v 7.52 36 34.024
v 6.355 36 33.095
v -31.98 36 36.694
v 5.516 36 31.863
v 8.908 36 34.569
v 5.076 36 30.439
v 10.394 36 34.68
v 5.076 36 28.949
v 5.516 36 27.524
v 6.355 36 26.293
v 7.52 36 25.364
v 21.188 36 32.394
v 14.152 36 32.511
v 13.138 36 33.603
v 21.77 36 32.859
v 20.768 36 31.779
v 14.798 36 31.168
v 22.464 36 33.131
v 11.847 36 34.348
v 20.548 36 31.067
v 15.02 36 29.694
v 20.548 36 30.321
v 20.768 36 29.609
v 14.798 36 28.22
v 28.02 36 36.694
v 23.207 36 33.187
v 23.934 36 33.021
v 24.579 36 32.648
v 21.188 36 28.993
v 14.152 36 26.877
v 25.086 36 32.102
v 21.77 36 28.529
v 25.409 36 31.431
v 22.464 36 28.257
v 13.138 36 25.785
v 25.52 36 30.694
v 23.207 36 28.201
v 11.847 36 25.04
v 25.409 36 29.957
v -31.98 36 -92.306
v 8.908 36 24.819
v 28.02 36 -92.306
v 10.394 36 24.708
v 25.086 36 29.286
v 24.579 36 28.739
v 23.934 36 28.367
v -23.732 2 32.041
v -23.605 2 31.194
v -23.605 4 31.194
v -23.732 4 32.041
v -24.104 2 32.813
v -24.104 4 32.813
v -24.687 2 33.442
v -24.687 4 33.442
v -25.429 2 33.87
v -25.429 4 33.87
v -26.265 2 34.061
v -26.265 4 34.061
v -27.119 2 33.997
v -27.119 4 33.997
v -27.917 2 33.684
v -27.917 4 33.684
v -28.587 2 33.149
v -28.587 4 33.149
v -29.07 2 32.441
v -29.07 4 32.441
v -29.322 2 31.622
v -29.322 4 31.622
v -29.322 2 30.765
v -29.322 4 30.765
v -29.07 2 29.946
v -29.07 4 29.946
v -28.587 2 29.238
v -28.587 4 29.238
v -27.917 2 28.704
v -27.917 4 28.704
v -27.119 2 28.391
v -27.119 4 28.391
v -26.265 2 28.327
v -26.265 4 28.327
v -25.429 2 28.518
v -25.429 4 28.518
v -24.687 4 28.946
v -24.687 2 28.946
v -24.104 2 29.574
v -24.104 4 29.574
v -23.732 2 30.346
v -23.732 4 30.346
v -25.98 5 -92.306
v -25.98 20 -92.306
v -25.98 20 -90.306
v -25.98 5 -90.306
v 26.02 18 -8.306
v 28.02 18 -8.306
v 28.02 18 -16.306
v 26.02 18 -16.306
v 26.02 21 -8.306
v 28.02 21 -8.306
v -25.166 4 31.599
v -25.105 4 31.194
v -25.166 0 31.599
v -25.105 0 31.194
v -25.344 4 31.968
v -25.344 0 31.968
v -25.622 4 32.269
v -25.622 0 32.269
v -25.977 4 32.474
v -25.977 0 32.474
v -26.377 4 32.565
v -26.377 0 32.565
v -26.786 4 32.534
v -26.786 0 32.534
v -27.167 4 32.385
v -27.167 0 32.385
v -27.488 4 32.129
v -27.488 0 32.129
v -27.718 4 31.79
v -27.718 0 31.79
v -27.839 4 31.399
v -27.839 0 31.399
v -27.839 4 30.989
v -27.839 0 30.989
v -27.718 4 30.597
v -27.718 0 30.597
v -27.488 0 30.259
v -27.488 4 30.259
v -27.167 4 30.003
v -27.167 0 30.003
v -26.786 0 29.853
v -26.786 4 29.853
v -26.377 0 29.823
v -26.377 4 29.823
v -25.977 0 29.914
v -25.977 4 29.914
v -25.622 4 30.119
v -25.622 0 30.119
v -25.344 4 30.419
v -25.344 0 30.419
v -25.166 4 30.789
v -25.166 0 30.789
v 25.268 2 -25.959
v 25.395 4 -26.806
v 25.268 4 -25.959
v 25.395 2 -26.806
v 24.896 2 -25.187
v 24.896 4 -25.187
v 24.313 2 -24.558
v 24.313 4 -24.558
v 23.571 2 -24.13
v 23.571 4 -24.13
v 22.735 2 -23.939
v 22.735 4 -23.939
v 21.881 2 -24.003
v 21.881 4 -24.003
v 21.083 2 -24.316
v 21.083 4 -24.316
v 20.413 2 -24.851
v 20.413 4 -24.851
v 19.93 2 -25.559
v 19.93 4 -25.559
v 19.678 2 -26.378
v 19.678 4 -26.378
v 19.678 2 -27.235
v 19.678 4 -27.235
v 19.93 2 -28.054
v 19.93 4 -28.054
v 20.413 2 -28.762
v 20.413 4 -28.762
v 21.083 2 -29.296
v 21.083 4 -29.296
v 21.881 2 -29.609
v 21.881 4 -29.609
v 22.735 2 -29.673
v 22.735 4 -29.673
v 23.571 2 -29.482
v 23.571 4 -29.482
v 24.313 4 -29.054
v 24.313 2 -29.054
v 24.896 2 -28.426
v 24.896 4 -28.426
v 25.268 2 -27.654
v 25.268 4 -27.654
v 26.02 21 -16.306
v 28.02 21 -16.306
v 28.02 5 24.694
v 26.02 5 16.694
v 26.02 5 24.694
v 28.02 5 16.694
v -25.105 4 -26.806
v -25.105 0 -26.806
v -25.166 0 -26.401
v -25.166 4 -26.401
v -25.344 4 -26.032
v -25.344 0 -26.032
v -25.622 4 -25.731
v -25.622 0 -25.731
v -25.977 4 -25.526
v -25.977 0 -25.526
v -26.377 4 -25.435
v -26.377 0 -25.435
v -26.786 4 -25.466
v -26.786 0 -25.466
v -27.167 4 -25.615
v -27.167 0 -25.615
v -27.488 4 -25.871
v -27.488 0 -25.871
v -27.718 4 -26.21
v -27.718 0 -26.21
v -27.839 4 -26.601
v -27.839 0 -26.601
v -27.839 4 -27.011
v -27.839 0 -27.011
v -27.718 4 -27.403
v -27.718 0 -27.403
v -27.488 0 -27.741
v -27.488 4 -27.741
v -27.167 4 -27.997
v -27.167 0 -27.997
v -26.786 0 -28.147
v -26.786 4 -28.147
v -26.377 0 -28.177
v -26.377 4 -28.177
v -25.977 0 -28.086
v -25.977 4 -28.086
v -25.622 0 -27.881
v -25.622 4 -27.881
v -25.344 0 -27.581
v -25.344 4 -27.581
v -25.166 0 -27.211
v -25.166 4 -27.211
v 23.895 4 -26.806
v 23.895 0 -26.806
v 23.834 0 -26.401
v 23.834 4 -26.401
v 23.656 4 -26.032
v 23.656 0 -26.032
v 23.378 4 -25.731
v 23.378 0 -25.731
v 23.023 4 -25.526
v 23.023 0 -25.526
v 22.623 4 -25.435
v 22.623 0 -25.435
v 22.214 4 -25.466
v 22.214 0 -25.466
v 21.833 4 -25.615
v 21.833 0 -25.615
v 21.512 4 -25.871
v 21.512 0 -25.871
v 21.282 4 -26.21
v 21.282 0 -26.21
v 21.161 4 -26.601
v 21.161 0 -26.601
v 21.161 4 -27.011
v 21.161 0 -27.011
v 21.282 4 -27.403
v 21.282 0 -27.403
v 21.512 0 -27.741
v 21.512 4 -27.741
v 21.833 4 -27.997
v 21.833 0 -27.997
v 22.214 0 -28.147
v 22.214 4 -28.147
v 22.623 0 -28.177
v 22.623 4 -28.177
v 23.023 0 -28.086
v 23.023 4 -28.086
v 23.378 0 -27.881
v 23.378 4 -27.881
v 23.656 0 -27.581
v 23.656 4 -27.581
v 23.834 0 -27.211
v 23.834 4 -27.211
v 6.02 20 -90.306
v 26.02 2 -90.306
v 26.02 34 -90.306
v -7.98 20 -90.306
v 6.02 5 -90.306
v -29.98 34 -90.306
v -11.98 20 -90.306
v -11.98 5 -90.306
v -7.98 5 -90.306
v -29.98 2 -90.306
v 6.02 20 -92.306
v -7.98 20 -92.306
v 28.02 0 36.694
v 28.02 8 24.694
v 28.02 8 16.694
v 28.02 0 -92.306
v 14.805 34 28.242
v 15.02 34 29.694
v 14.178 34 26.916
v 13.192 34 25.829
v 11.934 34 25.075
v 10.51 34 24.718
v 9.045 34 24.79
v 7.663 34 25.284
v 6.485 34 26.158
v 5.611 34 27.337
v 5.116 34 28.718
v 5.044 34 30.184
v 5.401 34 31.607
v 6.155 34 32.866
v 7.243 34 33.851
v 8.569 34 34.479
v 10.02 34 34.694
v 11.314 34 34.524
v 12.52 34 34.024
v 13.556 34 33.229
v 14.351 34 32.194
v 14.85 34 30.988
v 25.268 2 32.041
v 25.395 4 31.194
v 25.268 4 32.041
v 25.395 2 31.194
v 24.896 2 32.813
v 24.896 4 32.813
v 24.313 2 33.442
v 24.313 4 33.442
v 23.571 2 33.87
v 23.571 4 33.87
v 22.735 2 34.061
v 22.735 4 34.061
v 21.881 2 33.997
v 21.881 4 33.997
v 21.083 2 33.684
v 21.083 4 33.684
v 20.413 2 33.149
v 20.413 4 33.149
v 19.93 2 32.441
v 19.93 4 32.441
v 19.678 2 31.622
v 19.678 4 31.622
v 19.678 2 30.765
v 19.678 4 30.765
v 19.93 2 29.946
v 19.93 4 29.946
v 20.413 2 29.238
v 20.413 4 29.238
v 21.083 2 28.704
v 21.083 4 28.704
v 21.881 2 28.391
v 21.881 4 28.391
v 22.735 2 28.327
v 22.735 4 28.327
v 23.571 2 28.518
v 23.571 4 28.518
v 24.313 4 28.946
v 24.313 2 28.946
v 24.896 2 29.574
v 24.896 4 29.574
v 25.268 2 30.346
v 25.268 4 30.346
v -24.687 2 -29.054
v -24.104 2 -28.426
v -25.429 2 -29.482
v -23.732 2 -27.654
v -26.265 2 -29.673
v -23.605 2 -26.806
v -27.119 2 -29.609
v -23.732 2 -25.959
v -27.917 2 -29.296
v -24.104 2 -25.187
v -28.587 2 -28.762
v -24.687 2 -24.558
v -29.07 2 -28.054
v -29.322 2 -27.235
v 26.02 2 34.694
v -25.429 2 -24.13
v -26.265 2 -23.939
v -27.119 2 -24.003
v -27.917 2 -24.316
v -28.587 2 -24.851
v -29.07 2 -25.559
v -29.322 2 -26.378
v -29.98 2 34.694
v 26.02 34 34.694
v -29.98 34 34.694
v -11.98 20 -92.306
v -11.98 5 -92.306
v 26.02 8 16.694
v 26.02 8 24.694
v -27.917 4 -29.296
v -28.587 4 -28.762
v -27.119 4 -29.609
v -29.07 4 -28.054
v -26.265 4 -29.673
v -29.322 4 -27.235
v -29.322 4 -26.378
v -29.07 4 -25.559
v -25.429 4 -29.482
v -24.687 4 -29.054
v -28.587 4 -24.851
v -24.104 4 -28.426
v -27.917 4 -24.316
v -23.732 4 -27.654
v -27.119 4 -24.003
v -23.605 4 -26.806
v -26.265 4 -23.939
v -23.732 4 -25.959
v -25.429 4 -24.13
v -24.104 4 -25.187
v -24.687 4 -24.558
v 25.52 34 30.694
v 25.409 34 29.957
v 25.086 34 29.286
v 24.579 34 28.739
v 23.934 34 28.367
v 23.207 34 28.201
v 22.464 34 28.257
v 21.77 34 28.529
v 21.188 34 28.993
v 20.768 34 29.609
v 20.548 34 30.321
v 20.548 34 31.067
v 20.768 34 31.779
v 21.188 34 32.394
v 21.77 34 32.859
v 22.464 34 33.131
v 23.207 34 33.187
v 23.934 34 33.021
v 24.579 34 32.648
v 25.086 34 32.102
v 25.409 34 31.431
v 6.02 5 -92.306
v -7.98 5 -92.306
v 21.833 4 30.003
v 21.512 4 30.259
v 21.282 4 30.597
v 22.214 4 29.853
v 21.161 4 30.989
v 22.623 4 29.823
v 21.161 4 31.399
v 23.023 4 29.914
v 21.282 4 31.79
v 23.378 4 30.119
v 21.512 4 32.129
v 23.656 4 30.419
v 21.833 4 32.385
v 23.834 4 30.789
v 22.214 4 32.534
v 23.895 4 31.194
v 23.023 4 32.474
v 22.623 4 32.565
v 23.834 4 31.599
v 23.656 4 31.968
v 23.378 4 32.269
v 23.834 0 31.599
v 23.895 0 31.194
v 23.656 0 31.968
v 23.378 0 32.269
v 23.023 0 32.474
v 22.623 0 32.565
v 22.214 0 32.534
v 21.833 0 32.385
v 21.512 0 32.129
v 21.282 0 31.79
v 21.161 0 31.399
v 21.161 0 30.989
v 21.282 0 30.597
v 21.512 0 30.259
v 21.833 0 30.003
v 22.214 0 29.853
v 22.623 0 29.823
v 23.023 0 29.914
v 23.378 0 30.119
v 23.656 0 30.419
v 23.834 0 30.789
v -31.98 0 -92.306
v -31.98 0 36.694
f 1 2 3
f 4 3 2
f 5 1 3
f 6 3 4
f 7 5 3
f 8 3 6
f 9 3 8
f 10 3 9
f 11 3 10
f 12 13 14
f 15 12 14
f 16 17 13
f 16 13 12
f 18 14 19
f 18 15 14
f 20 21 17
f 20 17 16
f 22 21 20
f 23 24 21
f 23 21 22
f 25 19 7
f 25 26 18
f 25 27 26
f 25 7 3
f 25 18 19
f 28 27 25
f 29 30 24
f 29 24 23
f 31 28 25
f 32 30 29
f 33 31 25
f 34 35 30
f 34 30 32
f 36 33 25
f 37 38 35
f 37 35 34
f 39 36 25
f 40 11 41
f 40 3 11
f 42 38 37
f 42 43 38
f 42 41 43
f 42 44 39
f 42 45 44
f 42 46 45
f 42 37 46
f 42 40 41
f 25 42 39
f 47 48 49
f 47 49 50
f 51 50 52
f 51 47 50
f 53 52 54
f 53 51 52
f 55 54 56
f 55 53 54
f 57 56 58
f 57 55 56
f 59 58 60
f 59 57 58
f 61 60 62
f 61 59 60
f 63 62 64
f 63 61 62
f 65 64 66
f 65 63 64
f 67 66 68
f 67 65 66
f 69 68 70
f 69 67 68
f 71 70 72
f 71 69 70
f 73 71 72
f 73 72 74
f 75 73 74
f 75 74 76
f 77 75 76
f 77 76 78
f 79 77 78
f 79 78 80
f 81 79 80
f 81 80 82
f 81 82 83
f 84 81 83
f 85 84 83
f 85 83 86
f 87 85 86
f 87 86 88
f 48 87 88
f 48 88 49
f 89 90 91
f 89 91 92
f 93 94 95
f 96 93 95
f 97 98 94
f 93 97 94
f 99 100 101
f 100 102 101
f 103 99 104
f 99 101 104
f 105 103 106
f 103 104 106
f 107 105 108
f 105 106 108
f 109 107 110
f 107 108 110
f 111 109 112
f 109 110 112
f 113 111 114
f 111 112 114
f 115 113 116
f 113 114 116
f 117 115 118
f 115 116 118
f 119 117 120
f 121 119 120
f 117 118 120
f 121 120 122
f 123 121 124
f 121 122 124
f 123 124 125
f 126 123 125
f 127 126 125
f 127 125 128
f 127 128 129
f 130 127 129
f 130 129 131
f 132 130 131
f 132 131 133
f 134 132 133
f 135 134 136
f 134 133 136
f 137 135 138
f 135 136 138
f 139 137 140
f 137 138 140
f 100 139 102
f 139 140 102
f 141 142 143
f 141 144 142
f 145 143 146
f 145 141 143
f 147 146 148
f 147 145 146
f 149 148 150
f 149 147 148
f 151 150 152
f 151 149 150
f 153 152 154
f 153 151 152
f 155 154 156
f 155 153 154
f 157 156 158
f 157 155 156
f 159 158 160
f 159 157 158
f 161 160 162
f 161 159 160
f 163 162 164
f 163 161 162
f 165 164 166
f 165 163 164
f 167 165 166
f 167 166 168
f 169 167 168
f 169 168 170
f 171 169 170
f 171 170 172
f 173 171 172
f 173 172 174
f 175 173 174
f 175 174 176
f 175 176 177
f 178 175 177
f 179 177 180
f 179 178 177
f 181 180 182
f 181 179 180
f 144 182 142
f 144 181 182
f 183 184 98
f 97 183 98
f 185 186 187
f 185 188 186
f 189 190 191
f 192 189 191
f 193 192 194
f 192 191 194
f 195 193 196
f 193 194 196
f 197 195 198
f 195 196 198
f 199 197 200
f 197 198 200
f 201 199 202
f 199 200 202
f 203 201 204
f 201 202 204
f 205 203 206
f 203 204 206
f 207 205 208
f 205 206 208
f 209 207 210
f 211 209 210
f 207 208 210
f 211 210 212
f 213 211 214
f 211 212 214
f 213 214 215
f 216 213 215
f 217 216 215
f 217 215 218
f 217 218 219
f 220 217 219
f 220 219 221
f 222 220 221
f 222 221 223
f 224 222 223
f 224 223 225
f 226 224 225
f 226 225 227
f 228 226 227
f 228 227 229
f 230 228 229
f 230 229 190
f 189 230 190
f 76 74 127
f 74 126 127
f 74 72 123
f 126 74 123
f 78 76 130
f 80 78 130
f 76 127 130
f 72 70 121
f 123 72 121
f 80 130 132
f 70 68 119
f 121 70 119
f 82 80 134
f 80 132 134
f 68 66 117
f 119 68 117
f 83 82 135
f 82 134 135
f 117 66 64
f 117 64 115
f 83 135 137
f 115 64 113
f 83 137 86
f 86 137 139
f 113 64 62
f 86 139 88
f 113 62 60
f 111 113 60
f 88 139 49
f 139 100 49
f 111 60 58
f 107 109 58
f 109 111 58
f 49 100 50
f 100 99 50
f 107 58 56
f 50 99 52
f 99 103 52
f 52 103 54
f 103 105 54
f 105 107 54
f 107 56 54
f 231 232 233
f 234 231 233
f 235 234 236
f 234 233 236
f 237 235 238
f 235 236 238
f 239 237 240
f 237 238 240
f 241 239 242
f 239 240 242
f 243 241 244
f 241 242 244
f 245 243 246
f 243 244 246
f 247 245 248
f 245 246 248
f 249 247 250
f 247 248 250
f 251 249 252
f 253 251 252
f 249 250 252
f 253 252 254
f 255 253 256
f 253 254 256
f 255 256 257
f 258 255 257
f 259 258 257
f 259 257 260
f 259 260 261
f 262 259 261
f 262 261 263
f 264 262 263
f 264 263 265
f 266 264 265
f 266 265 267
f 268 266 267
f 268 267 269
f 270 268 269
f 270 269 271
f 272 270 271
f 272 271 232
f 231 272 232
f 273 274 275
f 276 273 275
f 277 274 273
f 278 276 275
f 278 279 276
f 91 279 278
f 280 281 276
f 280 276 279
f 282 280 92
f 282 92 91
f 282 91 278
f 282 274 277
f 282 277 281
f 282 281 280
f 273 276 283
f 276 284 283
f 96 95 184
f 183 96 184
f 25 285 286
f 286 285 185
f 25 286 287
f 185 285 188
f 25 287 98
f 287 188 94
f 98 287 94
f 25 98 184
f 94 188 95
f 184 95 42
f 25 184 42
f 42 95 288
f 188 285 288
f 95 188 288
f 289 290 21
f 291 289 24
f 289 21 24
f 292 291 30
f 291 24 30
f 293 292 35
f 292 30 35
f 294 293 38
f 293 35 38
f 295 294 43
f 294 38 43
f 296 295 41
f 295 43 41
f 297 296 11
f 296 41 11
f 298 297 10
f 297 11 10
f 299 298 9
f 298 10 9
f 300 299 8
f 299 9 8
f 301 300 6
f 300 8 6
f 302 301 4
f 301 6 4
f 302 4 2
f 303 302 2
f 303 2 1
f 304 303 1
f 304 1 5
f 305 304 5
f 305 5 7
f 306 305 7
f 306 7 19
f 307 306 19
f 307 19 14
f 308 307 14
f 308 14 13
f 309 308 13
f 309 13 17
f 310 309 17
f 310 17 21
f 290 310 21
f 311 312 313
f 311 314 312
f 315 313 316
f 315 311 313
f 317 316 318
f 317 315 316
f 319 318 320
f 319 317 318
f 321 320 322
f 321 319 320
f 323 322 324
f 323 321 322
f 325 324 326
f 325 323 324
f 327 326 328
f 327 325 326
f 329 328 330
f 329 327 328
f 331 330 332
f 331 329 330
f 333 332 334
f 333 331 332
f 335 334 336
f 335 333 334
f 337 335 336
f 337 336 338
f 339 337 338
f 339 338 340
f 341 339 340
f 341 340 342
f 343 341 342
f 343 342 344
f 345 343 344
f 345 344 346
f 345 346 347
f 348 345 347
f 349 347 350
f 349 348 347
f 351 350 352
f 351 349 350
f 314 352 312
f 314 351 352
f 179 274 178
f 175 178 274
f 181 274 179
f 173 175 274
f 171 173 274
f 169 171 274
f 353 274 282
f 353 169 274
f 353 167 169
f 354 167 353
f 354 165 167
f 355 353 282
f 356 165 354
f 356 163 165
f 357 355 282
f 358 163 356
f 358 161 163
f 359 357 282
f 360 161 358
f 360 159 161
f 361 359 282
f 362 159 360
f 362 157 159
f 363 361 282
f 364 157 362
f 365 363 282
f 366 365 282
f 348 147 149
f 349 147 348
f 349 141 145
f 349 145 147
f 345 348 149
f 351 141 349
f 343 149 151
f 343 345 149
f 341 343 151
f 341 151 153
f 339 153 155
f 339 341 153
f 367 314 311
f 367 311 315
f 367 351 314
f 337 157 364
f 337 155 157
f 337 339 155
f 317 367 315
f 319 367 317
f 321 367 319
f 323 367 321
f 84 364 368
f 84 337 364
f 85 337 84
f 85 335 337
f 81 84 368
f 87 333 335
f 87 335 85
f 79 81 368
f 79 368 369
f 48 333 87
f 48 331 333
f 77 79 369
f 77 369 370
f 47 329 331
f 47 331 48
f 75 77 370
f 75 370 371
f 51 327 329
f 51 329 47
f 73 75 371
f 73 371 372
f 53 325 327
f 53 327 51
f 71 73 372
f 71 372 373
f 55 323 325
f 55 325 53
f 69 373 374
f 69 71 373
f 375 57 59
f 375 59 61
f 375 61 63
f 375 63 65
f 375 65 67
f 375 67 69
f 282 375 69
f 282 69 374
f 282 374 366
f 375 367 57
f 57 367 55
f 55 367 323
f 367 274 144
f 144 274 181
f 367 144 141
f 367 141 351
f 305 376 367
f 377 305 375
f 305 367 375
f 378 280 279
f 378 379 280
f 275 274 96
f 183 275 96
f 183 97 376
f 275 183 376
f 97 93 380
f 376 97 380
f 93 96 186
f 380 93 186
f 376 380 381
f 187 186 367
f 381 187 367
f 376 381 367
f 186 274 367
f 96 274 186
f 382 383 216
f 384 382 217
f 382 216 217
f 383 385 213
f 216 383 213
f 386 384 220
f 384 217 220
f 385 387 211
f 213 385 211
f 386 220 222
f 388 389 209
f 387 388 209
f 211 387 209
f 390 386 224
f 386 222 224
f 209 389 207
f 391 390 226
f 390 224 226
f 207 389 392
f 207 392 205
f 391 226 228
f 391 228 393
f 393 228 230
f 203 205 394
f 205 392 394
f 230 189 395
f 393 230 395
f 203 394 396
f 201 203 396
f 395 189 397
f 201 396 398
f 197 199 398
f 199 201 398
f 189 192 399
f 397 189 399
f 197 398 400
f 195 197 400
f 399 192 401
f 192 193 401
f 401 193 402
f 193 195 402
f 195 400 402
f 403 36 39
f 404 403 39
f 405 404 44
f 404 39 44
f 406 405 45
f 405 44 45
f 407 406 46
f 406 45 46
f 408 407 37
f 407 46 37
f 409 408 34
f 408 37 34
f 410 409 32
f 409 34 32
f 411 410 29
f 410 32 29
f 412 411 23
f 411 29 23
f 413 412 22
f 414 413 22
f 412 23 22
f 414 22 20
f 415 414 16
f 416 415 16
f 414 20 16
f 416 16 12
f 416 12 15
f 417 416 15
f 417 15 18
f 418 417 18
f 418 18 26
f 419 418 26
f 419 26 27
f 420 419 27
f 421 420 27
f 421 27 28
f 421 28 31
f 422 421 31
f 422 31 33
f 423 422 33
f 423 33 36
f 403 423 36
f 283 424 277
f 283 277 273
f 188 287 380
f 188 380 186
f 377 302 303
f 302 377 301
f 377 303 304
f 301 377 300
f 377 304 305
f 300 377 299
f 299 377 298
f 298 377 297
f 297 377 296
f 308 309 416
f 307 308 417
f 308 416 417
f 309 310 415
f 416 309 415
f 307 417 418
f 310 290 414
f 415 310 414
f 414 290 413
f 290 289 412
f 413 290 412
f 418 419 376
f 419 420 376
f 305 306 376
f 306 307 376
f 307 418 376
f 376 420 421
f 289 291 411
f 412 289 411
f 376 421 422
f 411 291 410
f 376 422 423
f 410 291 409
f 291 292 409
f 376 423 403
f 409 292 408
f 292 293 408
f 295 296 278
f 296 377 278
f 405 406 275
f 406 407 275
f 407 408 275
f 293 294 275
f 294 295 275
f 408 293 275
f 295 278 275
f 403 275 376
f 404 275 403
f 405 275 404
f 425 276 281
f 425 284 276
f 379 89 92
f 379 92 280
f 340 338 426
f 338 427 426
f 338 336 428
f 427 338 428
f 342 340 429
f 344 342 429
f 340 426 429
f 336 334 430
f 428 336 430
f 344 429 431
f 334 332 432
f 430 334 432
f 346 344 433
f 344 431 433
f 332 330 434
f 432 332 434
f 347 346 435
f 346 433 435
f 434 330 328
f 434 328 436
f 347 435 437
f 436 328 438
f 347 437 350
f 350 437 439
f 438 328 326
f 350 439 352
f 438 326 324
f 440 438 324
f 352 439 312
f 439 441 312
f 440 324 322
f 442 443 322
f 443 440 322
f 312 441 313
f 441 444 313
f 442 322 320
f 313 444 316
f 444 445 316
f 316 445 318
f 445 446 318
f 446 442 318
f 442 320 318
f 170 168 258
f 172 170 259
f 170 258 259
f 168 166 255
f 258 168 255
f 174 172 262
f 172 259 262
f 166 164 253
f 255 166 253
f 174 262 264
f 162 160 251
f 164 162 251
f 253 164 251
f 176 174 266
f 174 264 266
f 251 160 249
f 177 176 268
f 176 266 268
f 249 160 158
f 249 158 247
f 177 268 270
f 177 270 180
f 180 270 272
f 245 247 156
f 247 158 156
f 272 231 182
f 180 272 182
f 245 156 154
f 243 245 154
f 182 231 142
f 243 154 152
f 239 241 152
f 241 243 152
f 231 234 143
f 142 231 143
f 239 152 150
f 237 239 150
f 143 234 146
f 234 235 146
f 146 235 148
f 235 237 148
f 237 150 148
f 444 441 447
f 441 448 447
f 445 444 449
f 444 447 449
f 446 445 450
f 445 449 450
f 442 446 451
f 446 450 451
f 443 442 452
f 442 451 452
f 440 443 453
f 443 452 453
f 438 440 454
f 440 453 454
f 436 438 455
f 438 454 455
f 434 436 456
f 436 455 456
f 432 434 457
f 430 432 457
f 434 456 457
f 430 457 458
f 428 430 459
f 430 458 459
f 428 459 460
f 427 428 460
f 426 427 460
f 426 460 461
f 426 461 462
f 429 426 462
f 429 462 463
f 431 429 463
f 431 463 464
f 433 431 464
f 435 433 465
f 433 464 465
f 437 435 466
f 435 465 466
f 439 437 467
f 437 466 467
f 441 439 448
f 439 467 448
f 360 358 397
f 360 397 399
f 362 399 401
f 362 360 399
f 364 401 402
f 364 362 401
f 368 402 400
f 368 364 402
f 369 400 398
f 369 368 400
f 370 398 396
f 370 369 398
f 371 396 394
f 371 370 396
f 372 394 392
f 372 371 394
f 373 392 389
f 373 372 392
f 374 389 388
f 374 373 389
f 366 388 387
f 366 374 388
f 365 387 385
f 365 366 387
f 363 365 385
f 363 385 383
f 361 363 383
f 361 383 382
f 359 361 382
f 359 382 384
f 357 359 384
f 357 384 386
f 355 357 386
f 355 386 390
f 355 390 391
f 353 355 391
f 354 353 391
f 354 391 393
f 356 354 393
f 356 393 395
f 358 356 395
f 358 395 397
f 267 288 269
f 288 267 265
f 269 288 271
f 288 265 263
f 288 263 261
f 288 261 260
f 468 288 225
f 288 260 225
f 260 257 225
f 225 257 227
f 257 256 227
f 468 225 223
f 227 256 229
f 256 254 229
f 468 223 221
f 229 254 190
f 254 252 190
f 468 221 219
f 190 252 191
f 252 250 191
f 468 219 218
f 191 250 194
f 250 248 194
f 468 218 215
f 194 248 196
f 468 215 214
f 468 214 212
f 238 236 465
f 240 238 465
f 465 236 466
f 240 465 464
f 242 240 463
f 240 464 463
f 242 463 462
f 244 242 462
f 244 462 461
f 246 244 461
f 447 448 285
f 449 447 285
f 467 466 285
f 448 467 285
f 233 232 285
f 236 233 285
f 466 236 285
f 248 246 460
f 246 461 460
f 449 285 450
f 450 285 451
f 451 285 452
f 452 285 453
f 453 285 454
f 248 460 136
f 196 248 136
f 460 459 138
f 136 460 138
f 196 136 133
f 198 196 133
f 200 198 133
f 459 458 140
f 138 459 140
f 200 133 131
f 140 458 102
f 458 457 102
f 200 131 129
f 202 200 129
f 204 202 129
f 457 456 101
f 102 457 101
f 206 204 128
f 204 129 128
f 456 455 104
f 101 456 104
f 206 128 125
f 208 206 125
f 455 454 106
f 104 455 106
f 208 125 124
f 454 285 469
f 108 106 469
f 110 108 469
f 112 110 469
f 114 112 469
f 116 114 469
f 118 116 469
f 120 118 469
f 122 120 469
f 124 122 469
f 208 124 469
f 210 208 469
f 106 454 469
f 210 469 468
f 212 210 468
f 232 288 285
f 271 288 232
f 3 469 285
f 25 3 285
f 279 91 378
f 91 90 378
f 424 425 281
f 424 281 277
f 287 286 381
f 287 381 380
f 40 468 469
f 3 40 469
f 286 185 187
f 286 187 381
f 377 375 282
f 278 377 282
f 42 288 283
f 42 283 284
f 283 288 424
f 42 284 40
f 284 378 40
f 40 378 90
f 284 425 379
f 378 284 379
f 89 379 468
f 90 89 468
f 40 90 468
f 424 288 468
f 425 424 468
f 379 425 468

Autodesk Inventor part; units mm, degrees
ref_plane "YZ Plane" through (0, 0, 0) normal (1, 0, 0) x (0, 1, 0)
ref_plane "XZ Plane" through (0, 0, 0) normal (0, 1, 0) x (-1, 0, 0)
ref_plane "XY Plane" through (0, 0, 0) normal (0, 0, 1) x (1, 0, 0)
sketch "Esquisse1" plane through (0, 0, 0) normal (0, 1, 0) x (-1, 0, 0)
  line L0 (29.9796, 34.6939) -> (-26.0204, 34.6939)
  line L1 (-26.0204, 34.6939) -> (-26.0204, -50.3061)
  line L2 (29.9796, -50.3061) -> (29.9796, 34.6939)
  circle A0 centre (26.4796, 31.1939) radius 1.375
  circle A1 centre (-22.5204, 31.1939) radius 1.375
  circle A2 centre (26.4796, -26.8061) radius 1.375
  circle A3 centre (-22.5204, -26.8061) radius 1.375
  circle A4 centre (26.4796, 31.1939) radius 2.875
  circle A5 centre (-22.5204, 31.1939) radius 2.875
  circle A6 centre (-22.5204, -26.8061) radius 2.875
  circle A7 centre (26.4796, -26.8061) radius 2.875
  line L3 (-26.0204, -50.3061) -> (-26.0204, -90.3061)
  line L4 (-26.0204, -90.3061) -> (29.9796, -90.3061)
  line L5 (29.9796, -90.3061) -> (29.9796, -50.3061)
  line L6 (31.9796, 36.6939) -> (-28.0204, 36.6939)
  line L7 (-28.0204, 36.6939) -> (-28.0204, -92.3061)
  line L8 (-28.0204, -92.3061) -> (31.9796, -92.3061)
  line L9 (31.9796, -92.3061) -> (31.9796, 36.6939)
  point P0 (0, 0)
  dimension "d3" = 2.75
  dimension "d4" = 3.5
  dimension "d5" = 2.75
  dimension "d6" = 3.5
  dimension "d7" = 3.5
  dimension "d8" = 49
  dimension "d9" = 2.75
  dimension "d10" = 58
  dimension "d11" = 3.5
  dimension "d12" = 2.75
  dimension "d13" = 3.5
  dimension "d14" = 58
  dimension "d15" = 5.75
  dimension "d16" = 5.75
  dimension "d17" = 5.75
  dimension "d18" = 5.75
  dimension "d21" = 2
  dimension "d22" = 2
  dimension "d23" = 2
  dimension "d24" = 2
  dimension "d25" = 125
extrude "Extrusion1" add sketch "Esquisse1" along normal blind 2 contours L2 L5 L4 L3 L1 L0 | L9 L8 L7 L6
sketch "Esquisse2" plane through (0, 0, 0) normal (0, -1, 0) x (1, 0, 0)
  circle A0 centre (22.5204, 31.1939) radius 2.875 projected
  circle A1 centre (22.5204, 31.1939) radius 1.375
  circle A2 centre (-26.4796, 31.1939) radius 1.375
  circle A3 centre (22.5204, -26.8061) radius 1.375
  circle A4 centre (-26.4796, -26.8061) radius 1.375
  circle A5 centre (22.5204, -26.8061) radius 2.875 projected
  circle A6 centre (-26.4796, -26.8061) radius 2.875 projected
  circle A7 centre (-26.4796, 31.1939) radius 2.875 projected
  point P0 (0, 0)
  dimension "d28" = 2.75
  dimension "d29" = 2.75
  dimension "d30" = 2.75
  dimension "d31" = 2.75
  dimension "d33" = 0
  dimension "d34" = 0
  dimension "d35" = 0
  dimension "d36" = 0
  dimension "d37" = 0
extrude "Extrusion2" add sketch "Esquisse2" against normal blind 4
sketch "Esquisse3" plane through (0, 2, 0) normal (0, 1, 0) x (1, 0, 0)
  line L0 (-29.9796, -34.6939) -> (26.0204, -34.6939)
  line L1 (26.0204, -34.6939) -> (26.0204, 90.3061)
  line L2 (26.0204, 90.3061) -> (-29.9796, 90.3061)
  line L3 (-29.9796, 90.3061) -> (-29.9796, -34.6939)
  line L4 (-31.9796, 92.3061) -> (-31.9796, -36.6939) projected
  line L5 (-31.9796, -36.6939) -> (28.0204, -36.6939) projected
  line L6 (28.0204, 92.3061) -> (-31.9796, 92.3061) projected
  line L7 (28.0204, -36.6939) -> (28.0204, 92.3061) projected
  point P0 (0, 0)
  dimension "d40" = 2
  dimension "d41" = 2
  dimension "d42" = 2
  dimension "d43" = 2
extrude "Extrusion3" add sketch "Esquisse3" along normal blind 18
sketch "Esquisse4" plane through (28.0204, 0, -92.3061) normal (0, 0, -1) x (-1, 0, 0)
  line L0 (22, 20) -> (36, 20)
  line L1 (36, 20) -> (36, 5)
  line L2 (36, 5) -> (22, 5)
  line L3 (22, 5) -> (22, 20)
  line L4 (40, 20) -> (54, 20)
  line L5 (54, 20) -> (54, 5)
  line L6 (54, 5) -> (40, 5)
  line L7 (40, 5) -> (40, 20)
  line L8 (0, 0) -> (60, 0) projected
  line L9 (0, 0) -> (0, 20) projected
  point P0 (28.0204, 0)
  dimension "d46" = 5
  dimension "d47" = 5
  dimension "d48" = 14
  dimension "d49" = 14
  dimension "d51" = 22
  dimension "d52" = 40
  dimension "d53" = 15
extrude "Extrusion4" cut sketch "Esquisse4" against normal blind 20
sketch "Esquisse5" plane through (28.0204, 0, 36.6939) normal (1, 0, 0) x (0, 0, -1)
  line L0 (12, 8) -> (20, 8)
  line L1 (20, 8) -> (20, 5)
  line L2 (20, 5) -> (12, 5)
  line L3 (12, 5) -> (12, 8)
  line L4 (0, 0) -> (0, 20) projected
  line L5 (0, 0) -> (129, 0) projected
  point P0 (36.6939, 0)
  dimension "d56" = 12
  dimension "d57" = 8
  dimension "d58" = 3
  dimension "d59" = 5
extrude "Extrusion5" cut sketch "Esquisse5" against normal blind 20
sketch "Esquisse6" plane through (28.0204, 0, 36.6939) normal (1, 0, 0) x (0, 0, -1)
  line L0 (53, 21) -> (45, 21)
  line L1 (45, 21) -> (45, 18)
  line L2 (45, 18) -> (53, 18)
  line L3 (53, 18) -> (53, 21)
  line L4 (0, 0) -> (129, 0) projected
  line L5 (0, 20) -> (129, 20) projected
  line L6 (0, 0) -> (0, 20) projected
  point P0 (36.6939, 0)
  dimension "d62" = 18
  dimension "d66" = 3
  dimension "d67" = 8
  dimension "d68" = 45
sketch "Esquisse7" plane through (0, 20, 0) normal (0, 1, 0) x (1, 0, 0)
  line L0 (-31.9796, 92.3061) -> (-31.9796, -36.6939) projected
  line L1 (28.0204, 92.3061) -> (6.0204, 92.3061) projected
  line L2 (-31.9796, -36.6939) -> (28.0204, -36.6939)
  line L3 (28.0204, -36.6939) -> (28.0204, 92.3061)
  line L4 (28.0204, 92.3061) -> (-31.9796, 92.3061)
  line L5 (-31.9796, 92.3061) -> (-31.9796, -36.6939)
  line L6 (26.0204, 90.3061) -> (-29.9796, 90.3061) projected
  line L7 (26.0204, 90.3061) -> (26.0204, -34.6939) projected
  line L8 (-29.9796, 90.3061) -> (26.0204, 90.3061)
  line L9 (26.0204, 90.3061) -> (26.0204, -34.6939)
  line L10 (26.0204, -34.6939) -> (-29.9796, -34.6939)
  line L11 (-29.9796, -34.6939) -> (-29.9796, 90.3061)
  point P0 (0, 0)
extrude "Extrusion6" add sketch "Esquisse7" along normal blind 14
extrude "Extrusion7" cut sketch "Esquisse6" against normal blind 14
sketch "Esquisse8" plane through (0, 34, 0) normal (0, 1, 0) x (1, 0, 0)
  line L0 (-31.9796, 92.3061) -> (-31.9796, -36.6939) projected
  line L1 (28.0204, -36.6939) -> (28.0204, 92.3061) projected
  line L2 (-31.9796, -36.6939) -> (28.0204, -36.6939)
  line L3 (28.0204, -36.6939) -> (28.0204, 92.3061)
  line L4 (28.0204, 92.3061) -> (-31.9796, 92.3061)
  line L5 (-31.9796, 92.3061) -> (-31.9796, -36.6939)
  point P0 (0, 0)
extrude "Extrusion8" add sketch "Esquisse8" along normal blind 2
sketch "Esquisse9" plane through (0, 36, 0) normal (0, 1, 0) x (1, 0, 0)
  circle A0 centre (10.0204, -29.6939) radius 5
  line L0 (28.0204, -36.6939) -> (28.0204, 92.3061) projected
  line L1 (-31.9796, -36.6939) -> (28.0204, -36.6939) projected
  point P0 (0, 0)
  dimension "d75" = 10
  dimension "d76" = 18
  dimension "d77" = 7
extrude "Extrusion9" cut sketch "Esquisse9" against normal blind 3
sketch "Esquisse10" plane through (0, 36, 0) normal (0, 1, 0) x (1, 0, 0)
  circle A0 centre (23.0204, -30.6939) radius 2.5
  circle A1 centre (10.0204, -29.6939) radius 5 projected
  line L0 (-31.9796, -36.6939) -> (28.0204, -36.6939) projected
  point P0 (0, 0)
  dimension "d80" = 13
  dimension "d81" = 5
  dimension "d82" = 6
extrude "Extrusion10" cut sketch "Esquisse10" against normal blind 3 contours A0
